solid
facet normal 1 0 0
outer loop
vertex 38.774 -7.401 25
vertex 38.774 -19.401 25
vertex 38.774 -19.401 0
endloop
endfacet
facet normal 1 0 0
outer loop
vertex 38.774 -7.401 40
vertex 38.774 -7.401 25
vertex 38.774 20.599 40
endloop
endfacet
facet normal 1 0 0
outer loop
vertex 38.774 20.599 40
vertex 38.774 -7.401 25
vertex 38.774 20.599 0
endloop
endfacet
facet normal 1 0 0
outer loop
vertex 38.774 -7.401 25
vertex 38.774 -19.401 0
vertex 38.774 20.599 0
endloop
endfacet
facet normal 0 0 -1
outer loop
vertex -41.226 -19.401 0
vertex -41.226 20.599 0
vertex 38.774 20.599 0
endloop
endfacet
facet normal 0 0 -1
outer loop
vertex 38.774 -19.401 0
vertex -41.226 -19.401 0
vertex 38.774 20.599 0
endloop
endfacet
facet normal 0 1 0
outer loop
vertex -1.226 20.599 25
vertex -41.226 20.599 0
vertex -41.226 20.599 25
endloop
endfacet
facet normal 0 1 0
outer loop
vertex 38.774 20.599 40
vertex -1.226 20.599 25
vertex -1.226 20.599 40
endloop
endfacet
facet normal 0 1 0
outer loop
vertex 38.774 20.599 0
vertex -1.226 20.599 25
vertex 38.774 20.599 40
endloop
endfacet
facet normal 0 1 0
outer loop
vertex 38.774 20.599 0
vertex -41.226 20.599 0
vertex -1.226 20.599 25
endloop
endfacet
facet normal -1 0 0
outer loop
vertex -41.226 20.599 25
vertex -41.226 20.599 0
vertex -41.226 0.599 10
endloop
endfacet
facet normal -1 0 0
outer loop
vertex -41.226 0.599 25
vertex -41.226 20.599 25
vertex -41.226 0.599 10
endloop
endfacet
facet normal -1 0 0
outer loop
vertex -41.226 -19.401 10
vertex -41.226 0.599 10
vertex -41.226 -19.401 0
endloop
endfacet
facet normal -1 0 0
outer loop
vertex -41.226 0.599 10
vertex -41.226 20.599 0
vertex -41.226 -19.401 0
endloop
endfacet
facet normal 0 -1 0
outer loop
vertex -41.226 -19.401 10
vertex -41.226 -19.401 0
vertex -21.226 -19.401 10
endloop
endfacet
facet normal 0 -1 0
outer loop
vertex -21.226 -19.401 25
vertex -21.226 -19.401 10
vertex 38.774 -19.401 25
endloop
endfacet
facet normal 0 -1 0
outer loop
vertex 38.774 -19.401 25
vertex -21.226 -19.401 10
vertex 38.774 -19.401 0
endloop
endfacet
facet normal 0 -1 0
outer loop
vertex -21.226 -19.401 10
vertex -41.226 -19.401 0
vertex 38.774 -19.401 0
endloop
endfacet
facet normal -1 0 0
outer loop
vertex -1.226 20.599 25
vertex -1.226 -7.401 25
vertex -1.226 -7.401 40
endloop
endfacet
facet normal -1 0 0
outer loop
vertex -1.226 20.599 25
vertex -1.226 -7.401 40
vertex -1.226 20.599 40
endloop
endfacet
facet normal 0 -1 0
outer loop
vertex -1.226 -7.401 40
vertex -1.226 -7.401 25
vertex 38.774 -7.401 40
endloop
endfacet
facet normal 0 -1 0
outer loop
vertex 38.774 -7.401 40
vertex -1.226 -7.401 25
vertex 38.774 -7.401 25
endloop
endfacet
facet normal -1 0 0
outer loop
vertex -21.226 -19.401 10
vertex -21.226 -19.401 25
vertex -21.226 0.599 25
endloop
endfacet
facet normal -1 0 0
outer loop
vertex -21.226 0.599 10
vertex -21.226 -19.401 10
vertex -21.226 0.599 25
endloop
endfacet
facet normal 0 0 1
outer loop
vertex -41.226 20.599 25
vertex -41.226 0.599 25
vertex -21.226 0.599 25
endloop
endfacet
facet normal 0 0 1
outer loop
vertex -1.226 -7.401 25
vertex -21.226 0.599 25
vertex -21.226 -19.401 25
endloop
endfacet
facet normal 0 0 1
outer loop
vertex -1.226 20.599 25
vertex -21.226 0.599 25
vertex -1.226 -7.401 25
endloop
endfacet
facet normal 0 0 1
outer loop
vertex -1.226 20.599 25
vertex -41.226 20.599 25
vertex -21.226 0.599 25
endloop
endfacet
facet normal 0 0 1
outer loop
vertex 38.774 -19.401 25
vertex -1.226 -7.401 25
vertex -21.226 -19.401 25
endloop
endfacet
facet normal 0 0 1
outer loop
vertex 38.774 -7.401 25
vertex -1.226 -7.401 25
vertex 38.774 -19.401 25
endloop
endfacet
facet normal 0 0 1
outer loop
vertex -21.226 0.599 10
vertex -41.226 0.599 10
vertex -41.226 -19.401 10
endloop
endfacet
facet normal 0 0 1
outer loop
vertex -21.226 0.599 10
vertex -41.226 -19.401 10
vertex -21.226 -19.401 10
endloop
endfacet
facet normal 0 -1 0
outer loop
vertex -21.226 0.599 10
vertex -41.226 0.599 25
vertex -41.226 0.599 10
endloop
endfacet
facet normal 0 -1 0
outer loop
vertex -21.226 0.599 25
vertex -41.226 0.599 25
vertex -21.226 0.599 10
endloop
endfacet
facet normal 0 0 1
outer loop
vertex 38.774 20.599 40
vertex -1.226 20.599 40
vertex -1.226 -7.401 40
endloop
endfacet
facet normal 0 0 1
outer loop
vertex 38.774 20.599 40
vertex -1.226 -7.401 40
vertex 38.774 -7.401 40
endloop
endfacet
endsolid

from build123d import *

# Parameters (mm, degrees)
F0_W     = 40
F0_H     = 28
F0_W_2   = 20
F0_H_2   = 20
F1_DEPTH = 25
F2_W     = 20
F2_H     = 20
F3_DEPTH = 15
F4_W     = 40
F4_H     = 28
F5_DEPTH = 15


with BuildPart() as f1:
    # F0 (on Top) → F1 (new body)
    with BuildSketch(Plane.XY):
        Polygon((-1.226237, 20.598543), (-41.226237, 20.598543), (-41.226237, 0.598543), (-21.226237, 0.598543), (-21.226237, -19.401457), (38.773763, -19.401457), (38.773763, -7.401457), (-1.226237, -7.401457), align=None)
        with Locations((18.773763, 6.598543)):
            Rectangle(F0_W, F0_H)
        with Locations((-31.226237, -9.401457)):
            Rectangle(F0_W_2, F0_H_2)
    extrude(amount=F1_DEPTH)

    # F2 (on face) → F3 (cut)
    with BuildSketch(Plane.XY.offset(25)):
        with Locations((-31.226237, -9.401457)):
            Rectangle(F2_W, F2_H)
    extrude(amount=-F3_DEPTH, mode=Mode.SUBTRACT)

    # F4 (on face) → F5 (join)
    with BuildSketch(Plane.XY.offset(25)):
        with Locations((18.773763, 6.598543)):
            Rectangle(F4_W, F4_H)
    extrude(amount=F5_DEPTH)


solid = f1.part
